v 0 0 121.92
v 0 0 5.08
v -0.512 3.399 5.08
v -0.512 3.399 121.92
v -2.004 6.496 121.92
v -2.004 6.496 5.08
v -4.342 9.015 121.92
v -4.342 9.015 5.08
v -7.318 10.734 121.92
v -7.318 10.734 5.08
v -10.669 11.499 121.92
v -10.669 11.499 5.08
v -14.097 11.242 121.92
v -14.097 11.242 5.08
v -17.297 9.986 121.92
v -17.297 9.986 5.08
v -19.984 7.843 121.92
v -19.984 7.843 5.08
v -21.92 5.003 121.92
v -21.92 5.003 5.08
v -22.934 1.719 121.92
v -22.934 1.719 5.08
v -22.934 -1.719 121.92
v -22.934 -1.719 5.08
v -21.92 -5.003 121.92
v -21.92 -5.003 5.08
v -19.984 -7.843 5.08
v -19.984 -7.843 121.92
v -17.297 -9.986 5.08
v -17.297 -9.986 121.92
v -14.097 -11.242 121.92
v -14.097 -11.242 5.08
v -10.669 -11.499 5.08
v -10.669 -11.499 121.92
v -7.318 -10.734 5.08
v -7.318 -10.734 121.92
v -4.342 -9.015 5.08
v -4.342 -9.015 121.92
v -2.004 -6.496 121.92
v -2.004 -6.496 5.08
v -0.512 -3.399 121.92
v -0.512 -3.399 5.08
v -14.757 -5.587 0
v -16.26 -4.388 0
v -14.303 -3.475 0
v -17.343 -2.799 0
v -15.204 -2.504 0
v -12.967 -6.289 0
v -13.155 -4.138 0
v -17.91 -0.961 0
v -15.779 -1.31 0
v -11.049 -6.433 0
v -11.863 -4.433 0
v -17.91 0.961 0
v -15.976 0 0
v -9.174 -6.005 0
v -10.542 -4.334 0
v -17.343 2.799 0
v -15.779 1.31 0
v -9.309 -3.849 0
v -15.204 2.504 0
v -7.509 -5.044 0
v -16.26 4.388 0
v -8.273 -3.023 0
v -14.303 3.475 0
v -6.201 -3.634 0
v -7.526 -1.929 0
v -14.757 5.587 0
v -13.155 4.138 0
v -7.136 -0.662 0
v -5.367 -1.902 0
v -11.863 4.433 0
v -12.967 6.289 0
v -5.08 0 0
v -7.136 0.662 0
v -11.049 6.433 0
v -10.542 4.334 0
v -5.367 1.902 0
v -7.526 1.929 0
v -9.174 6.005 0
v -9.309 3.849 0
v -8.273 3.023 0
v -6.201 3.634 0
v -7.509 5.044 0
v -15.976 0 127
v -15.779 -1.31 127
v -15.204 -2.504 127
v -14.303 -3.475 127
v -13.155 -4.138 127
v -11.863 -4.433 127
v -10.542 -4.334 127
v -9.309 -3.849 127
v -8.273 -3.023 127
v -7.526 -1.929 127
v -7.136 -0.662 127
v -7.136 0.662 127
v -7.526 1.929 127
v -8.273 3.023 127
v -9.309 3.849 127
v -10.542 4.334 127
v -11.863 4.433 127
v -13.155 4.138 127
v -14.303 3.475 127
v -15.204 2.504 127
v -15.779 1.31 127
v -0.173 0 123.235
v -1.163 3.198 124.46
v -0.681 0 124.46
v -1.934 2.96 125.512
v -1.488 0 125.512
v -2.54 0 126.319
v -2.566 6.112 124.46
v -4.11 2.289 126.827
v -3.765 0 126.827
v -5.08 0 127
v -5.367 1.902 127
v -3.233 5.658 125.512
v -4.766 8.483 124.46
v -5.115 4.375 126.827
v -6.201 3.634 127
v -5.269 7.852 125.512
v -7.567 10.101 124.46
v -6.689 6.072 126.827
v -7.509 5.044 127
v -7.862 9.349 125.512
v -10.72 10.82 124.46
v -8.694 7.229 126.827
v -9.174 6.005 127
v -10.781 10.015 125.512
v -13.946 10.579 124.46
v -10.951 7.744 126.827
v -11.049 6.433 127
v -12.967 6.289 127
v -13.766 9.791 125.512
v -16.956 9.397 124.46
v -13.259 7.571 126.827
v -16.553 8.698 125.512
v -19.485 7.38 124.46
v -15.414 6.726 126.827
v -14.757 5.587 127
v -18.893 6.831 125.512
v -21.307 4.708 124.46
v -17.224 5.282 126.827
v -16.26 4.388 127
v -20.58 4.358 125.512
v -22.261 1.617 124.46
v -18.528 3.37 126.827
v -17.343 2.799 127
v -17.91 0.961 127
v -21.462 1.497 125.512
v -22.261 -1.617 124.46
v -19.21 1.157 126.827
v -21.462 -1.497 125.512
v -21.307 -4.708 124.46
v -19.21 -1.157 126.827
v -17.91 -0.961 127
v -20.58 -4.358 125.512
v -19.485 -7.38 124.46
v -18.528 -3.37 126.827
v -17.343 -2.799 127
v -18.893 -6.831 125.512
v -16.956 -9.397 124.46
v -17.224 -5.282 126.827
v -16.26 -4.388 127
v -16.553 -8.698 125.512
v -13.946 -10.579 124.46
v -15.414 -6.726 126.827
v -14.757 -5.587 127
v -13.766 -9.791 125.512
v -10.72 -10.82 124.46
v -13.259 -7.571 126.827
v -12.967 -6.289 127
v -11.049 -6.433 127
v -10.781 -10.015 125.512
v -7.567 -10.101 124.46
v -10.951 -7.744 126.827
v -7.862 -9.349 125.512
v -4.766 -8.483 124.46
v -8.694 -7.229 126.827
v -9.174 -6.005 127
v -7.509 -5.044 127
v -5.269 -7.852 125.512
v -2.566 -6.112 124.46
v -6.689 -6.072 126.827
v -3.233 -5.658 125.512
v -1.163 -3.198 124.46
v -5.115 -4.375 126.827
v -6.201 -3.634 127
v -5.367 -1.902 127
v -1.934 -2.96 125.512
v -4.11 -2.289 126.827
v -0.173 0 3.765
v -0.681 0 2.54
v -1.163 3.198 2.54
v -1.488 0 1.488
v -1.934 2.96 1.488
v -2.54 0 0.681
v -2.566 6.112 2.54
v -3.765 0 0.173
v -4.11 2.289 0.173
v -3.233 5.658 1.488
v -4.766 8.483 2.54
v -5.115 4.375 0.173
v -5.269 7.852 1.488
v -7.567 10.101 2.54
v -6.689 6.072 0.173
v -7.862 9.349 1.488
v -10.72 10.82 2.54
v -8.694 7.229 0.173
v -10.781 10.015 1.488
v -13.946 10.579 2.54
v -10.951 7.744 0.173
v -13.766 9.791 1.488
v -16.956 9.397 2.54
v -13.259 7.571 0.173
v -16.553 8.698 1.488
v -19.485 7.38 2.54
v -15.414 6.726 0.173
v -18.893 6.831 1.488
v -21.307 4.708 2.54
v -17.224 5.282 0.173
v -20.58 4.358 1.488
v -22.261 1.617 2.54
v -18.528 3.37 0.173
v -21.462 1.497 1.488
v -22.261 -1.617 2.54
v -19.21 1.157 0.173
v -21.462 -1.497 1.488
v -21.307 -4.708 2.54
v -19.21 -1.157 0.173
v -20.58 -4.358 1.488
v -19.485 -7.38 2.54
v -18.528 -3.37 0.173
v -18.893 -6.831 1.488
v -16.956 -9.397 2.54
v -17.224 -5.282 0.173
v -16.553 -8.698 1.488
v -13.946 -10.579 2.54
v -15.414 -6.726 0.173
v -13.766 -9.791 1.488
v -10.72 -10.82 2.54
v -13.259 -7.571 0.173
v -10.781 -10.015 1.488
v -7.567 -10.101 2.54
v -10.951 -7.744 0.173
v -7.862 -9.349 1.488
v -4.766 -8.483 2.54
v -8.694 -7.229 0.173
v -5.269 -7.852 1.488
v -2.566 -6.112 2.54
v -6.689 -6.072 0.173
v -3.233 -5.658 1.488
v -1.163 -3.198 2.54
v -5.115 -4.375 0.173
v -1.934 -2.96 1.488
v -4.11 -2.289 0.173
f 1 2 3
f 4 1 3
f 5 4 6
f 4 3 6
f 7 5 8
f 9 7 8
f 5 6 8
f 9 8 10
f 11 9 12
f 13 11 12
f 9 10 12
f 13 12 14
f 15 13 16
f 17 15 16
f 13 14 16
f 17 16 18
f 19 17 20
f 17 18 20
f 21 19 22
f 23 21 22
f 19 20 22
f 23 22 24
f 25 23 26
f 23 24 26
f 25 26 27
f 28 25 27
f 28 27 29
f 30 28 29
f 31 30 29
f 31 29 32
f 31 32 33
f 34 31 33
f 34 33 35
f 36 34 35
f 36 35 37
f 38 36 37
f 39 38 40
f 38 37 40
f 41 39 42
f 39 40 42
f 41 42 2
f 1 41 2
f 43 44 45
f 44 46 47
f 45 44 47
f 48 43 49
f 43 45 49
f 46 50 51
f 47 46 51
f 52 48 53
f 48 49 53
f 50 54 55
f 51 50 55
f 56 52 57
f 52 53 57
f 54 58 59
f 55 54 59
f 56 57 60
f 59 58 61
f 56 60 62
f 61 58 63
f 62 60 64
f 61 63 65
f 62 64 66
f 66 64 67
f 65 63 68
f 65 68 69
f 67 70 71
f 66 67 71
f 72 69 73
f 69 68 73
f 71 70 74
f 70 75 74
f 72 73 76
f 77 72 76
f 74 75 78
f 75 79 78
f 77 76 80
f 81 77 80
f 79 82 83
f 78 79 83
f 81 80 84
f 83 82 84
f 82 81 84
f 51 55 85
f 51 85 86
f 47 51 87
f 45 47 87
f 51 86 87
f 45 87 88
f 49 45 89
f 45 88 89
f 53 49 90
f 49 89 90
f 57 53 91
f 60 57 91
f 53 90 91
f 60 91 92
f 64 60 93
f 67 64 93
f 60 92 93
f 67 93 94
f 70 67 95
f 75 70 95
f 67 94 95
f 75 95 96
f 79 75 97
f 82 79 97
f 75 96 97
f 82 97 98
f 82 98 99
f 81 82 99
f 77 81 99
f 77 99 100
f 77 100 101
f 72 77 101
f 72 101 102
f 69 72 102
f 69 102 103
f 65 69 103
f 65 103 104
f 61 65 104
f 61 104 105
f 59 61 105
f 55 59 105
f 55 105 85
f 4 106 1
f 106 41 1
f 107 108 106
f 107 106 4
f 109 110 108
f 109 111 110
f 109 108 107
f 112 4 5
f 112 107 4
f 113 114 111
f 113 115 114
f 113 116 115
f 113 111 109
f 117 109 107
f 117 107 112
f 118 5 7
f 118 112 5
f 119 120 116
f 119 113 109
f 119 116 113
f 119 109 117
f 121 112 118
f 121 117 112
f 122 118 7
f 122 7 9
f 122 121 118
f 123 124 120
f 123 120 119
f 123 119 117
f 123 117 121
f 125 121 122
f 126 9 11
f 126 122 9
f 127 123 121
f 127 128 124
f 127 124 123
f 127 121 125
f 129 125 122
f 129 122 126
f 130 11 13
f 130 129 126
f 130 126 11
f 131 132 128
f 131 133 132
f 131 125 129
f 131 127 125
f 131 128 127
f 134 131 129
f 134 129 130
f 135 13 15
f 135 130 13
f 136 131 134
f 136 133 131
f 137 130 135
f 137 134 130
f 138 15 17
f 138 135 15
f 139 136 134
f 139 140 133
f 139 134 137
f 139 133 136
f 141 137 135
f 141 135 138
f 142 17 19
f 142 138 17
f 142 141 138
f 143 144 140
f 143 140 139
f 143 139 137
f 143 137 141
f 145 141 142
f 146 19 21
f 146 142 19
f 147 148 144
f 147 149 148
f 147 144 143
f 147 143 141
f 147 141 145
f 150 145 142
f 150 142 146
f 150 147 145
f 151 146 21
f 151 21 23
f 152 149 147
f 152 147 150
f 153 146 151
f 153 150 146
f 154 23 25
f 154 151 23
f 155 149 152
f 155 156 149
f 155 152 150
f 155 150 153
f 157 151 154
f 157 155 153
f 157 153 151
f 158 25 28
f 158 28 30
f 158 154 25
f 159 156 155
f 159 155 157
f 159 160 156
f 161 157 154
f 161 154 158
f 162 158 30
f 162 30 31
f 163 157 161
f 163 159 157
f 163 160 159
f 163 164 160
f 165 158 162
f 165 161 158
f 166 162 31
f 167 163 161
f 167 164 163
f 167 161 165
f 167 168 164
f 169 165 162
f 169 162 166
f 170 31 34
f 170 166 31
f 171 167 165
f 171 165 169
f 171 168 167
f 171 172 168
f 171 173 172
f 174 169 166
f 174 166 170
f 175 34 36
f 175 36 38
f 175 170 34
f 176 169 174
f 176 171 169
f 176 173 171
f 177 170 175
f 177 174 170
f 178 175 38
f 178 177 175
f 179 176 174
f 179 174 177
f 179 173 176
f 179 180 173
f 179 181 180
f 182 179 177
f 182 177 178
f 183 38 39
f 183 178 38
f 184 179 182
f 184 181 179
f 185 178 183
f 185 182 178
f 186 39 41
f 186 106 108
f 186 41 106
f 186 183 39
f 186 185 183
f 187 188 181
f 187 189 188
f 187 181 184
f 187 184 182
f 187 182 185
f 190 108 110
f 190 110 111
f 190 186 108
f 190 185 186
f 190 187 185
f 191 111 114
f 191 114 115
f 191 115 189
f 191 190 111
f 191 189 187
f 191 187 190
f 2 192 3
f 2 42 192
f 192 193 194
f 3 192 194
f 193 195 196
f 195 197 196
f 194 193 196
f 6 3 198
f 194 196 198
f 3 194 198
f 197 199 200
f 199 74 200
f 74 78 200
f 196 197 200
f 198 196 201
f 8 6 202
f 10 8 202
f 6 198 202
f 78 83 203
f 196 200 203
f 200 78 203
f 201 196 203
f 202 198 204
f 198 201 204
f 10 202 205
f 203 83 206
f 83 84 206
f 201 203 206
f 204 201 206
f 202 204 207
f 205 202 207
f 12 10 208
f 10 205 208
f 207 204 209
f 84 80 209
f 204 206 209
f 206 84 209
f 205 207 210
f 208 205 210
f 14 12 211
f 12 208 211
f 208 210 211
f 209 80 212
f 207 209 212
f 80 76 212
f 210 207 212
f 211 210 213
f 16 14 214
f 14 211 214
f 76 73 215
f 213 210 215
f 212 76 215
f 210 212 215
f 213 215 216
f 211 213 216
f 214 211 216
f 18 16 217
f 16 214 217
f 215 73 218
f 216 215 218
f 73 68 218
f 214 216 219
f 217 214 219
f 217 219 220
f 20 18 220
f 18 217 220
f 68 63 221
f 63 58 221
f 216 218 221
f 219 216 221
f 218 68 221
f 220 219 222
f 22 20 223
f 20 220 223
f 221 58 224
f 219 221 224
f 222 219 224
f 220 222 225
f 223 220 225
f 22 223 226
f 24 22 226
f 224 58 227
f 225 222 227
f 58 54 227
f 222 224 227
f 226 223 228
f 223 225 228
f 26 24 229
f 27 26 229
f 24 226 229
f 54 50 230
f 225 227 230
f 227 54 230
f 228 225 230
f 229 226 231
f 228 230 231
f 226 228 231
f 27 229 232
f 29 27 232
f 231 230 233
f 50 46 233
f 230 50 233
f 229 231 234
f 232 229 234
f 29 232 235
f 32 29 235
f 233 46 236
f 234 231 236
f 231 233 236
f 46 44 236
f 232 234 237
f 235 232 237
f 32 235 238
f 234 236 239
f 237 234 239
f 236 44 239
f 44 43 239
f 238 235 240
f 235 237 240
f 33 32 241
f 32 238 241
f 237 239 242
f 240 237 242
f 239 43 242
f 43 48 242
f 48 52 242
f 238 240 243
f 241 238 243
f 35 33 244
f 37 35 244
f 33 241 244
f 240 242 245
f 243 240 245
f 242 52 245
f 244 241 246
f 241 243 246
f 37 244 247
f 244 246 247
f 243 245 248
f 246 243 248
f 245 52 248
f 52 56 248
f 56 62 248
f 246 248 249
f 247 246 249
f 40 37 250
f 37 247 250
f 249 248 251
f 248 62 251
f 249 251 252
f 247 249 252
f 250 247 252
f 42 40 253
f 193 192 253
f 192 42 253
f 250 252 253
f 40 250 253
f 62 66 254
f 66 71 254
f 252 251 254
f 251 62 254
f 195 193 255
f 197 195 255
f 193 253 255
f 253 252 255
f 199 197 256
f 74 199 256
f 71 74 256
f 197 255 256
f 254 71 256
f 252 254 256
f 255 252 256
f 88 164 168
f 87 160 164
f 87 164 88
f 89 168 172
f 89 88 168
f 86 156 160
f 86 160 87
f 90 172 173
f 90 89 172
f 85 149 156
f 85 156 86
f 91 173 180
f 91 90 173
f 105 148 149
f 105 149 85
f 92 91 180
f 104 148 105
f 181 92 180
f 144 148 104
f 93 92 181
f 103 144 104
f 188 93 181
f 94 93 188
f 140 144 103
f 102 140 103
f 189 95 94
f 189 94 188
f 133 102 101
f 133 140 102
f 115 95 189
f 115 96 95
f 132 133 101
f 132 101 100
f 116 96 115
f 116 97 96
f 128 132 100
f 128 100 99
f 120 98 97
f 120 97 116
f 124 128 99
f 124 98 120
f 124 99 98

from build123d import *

# Parameters (mm, degrees)
F0_R     = 11.531168
F1_DEPTH = 127
F3_D     = 8.89
F4_R     = 5.08
F5_R     = 5.08


with BuildPart() as f1:
    # F0 (on Top) → F1 (new body)
    with BuildSketch(Plane.XY):
        with Locations((-11.531168, 0)):
            Circle(F0_R)
    extrude(amount=F1_DEPTH)

    # F3 (through all)
    with Locations(Plane(origin=(0, 0, 0), x_dir=(1, 0, 0), z_dir=(0, 0, -1))):
        with Locations((-11.531168, 0)):
            Hole(F3_D / 2)

    # F4
    f4_edges = [f1.edges().sort_by_distance(p)[0] for p in [
        (-23.062335, 0, 127),
    ]]
    fillet(f4_edges, radius=F4_R)

    # F5
    f5_edges = [f1.edges().sort_by_distance(p)[0] for p in [
        (-23.062335, 0, 0),
    ]]
    fillet(f5_edges, radius=F5_R)


solid = f1.part
